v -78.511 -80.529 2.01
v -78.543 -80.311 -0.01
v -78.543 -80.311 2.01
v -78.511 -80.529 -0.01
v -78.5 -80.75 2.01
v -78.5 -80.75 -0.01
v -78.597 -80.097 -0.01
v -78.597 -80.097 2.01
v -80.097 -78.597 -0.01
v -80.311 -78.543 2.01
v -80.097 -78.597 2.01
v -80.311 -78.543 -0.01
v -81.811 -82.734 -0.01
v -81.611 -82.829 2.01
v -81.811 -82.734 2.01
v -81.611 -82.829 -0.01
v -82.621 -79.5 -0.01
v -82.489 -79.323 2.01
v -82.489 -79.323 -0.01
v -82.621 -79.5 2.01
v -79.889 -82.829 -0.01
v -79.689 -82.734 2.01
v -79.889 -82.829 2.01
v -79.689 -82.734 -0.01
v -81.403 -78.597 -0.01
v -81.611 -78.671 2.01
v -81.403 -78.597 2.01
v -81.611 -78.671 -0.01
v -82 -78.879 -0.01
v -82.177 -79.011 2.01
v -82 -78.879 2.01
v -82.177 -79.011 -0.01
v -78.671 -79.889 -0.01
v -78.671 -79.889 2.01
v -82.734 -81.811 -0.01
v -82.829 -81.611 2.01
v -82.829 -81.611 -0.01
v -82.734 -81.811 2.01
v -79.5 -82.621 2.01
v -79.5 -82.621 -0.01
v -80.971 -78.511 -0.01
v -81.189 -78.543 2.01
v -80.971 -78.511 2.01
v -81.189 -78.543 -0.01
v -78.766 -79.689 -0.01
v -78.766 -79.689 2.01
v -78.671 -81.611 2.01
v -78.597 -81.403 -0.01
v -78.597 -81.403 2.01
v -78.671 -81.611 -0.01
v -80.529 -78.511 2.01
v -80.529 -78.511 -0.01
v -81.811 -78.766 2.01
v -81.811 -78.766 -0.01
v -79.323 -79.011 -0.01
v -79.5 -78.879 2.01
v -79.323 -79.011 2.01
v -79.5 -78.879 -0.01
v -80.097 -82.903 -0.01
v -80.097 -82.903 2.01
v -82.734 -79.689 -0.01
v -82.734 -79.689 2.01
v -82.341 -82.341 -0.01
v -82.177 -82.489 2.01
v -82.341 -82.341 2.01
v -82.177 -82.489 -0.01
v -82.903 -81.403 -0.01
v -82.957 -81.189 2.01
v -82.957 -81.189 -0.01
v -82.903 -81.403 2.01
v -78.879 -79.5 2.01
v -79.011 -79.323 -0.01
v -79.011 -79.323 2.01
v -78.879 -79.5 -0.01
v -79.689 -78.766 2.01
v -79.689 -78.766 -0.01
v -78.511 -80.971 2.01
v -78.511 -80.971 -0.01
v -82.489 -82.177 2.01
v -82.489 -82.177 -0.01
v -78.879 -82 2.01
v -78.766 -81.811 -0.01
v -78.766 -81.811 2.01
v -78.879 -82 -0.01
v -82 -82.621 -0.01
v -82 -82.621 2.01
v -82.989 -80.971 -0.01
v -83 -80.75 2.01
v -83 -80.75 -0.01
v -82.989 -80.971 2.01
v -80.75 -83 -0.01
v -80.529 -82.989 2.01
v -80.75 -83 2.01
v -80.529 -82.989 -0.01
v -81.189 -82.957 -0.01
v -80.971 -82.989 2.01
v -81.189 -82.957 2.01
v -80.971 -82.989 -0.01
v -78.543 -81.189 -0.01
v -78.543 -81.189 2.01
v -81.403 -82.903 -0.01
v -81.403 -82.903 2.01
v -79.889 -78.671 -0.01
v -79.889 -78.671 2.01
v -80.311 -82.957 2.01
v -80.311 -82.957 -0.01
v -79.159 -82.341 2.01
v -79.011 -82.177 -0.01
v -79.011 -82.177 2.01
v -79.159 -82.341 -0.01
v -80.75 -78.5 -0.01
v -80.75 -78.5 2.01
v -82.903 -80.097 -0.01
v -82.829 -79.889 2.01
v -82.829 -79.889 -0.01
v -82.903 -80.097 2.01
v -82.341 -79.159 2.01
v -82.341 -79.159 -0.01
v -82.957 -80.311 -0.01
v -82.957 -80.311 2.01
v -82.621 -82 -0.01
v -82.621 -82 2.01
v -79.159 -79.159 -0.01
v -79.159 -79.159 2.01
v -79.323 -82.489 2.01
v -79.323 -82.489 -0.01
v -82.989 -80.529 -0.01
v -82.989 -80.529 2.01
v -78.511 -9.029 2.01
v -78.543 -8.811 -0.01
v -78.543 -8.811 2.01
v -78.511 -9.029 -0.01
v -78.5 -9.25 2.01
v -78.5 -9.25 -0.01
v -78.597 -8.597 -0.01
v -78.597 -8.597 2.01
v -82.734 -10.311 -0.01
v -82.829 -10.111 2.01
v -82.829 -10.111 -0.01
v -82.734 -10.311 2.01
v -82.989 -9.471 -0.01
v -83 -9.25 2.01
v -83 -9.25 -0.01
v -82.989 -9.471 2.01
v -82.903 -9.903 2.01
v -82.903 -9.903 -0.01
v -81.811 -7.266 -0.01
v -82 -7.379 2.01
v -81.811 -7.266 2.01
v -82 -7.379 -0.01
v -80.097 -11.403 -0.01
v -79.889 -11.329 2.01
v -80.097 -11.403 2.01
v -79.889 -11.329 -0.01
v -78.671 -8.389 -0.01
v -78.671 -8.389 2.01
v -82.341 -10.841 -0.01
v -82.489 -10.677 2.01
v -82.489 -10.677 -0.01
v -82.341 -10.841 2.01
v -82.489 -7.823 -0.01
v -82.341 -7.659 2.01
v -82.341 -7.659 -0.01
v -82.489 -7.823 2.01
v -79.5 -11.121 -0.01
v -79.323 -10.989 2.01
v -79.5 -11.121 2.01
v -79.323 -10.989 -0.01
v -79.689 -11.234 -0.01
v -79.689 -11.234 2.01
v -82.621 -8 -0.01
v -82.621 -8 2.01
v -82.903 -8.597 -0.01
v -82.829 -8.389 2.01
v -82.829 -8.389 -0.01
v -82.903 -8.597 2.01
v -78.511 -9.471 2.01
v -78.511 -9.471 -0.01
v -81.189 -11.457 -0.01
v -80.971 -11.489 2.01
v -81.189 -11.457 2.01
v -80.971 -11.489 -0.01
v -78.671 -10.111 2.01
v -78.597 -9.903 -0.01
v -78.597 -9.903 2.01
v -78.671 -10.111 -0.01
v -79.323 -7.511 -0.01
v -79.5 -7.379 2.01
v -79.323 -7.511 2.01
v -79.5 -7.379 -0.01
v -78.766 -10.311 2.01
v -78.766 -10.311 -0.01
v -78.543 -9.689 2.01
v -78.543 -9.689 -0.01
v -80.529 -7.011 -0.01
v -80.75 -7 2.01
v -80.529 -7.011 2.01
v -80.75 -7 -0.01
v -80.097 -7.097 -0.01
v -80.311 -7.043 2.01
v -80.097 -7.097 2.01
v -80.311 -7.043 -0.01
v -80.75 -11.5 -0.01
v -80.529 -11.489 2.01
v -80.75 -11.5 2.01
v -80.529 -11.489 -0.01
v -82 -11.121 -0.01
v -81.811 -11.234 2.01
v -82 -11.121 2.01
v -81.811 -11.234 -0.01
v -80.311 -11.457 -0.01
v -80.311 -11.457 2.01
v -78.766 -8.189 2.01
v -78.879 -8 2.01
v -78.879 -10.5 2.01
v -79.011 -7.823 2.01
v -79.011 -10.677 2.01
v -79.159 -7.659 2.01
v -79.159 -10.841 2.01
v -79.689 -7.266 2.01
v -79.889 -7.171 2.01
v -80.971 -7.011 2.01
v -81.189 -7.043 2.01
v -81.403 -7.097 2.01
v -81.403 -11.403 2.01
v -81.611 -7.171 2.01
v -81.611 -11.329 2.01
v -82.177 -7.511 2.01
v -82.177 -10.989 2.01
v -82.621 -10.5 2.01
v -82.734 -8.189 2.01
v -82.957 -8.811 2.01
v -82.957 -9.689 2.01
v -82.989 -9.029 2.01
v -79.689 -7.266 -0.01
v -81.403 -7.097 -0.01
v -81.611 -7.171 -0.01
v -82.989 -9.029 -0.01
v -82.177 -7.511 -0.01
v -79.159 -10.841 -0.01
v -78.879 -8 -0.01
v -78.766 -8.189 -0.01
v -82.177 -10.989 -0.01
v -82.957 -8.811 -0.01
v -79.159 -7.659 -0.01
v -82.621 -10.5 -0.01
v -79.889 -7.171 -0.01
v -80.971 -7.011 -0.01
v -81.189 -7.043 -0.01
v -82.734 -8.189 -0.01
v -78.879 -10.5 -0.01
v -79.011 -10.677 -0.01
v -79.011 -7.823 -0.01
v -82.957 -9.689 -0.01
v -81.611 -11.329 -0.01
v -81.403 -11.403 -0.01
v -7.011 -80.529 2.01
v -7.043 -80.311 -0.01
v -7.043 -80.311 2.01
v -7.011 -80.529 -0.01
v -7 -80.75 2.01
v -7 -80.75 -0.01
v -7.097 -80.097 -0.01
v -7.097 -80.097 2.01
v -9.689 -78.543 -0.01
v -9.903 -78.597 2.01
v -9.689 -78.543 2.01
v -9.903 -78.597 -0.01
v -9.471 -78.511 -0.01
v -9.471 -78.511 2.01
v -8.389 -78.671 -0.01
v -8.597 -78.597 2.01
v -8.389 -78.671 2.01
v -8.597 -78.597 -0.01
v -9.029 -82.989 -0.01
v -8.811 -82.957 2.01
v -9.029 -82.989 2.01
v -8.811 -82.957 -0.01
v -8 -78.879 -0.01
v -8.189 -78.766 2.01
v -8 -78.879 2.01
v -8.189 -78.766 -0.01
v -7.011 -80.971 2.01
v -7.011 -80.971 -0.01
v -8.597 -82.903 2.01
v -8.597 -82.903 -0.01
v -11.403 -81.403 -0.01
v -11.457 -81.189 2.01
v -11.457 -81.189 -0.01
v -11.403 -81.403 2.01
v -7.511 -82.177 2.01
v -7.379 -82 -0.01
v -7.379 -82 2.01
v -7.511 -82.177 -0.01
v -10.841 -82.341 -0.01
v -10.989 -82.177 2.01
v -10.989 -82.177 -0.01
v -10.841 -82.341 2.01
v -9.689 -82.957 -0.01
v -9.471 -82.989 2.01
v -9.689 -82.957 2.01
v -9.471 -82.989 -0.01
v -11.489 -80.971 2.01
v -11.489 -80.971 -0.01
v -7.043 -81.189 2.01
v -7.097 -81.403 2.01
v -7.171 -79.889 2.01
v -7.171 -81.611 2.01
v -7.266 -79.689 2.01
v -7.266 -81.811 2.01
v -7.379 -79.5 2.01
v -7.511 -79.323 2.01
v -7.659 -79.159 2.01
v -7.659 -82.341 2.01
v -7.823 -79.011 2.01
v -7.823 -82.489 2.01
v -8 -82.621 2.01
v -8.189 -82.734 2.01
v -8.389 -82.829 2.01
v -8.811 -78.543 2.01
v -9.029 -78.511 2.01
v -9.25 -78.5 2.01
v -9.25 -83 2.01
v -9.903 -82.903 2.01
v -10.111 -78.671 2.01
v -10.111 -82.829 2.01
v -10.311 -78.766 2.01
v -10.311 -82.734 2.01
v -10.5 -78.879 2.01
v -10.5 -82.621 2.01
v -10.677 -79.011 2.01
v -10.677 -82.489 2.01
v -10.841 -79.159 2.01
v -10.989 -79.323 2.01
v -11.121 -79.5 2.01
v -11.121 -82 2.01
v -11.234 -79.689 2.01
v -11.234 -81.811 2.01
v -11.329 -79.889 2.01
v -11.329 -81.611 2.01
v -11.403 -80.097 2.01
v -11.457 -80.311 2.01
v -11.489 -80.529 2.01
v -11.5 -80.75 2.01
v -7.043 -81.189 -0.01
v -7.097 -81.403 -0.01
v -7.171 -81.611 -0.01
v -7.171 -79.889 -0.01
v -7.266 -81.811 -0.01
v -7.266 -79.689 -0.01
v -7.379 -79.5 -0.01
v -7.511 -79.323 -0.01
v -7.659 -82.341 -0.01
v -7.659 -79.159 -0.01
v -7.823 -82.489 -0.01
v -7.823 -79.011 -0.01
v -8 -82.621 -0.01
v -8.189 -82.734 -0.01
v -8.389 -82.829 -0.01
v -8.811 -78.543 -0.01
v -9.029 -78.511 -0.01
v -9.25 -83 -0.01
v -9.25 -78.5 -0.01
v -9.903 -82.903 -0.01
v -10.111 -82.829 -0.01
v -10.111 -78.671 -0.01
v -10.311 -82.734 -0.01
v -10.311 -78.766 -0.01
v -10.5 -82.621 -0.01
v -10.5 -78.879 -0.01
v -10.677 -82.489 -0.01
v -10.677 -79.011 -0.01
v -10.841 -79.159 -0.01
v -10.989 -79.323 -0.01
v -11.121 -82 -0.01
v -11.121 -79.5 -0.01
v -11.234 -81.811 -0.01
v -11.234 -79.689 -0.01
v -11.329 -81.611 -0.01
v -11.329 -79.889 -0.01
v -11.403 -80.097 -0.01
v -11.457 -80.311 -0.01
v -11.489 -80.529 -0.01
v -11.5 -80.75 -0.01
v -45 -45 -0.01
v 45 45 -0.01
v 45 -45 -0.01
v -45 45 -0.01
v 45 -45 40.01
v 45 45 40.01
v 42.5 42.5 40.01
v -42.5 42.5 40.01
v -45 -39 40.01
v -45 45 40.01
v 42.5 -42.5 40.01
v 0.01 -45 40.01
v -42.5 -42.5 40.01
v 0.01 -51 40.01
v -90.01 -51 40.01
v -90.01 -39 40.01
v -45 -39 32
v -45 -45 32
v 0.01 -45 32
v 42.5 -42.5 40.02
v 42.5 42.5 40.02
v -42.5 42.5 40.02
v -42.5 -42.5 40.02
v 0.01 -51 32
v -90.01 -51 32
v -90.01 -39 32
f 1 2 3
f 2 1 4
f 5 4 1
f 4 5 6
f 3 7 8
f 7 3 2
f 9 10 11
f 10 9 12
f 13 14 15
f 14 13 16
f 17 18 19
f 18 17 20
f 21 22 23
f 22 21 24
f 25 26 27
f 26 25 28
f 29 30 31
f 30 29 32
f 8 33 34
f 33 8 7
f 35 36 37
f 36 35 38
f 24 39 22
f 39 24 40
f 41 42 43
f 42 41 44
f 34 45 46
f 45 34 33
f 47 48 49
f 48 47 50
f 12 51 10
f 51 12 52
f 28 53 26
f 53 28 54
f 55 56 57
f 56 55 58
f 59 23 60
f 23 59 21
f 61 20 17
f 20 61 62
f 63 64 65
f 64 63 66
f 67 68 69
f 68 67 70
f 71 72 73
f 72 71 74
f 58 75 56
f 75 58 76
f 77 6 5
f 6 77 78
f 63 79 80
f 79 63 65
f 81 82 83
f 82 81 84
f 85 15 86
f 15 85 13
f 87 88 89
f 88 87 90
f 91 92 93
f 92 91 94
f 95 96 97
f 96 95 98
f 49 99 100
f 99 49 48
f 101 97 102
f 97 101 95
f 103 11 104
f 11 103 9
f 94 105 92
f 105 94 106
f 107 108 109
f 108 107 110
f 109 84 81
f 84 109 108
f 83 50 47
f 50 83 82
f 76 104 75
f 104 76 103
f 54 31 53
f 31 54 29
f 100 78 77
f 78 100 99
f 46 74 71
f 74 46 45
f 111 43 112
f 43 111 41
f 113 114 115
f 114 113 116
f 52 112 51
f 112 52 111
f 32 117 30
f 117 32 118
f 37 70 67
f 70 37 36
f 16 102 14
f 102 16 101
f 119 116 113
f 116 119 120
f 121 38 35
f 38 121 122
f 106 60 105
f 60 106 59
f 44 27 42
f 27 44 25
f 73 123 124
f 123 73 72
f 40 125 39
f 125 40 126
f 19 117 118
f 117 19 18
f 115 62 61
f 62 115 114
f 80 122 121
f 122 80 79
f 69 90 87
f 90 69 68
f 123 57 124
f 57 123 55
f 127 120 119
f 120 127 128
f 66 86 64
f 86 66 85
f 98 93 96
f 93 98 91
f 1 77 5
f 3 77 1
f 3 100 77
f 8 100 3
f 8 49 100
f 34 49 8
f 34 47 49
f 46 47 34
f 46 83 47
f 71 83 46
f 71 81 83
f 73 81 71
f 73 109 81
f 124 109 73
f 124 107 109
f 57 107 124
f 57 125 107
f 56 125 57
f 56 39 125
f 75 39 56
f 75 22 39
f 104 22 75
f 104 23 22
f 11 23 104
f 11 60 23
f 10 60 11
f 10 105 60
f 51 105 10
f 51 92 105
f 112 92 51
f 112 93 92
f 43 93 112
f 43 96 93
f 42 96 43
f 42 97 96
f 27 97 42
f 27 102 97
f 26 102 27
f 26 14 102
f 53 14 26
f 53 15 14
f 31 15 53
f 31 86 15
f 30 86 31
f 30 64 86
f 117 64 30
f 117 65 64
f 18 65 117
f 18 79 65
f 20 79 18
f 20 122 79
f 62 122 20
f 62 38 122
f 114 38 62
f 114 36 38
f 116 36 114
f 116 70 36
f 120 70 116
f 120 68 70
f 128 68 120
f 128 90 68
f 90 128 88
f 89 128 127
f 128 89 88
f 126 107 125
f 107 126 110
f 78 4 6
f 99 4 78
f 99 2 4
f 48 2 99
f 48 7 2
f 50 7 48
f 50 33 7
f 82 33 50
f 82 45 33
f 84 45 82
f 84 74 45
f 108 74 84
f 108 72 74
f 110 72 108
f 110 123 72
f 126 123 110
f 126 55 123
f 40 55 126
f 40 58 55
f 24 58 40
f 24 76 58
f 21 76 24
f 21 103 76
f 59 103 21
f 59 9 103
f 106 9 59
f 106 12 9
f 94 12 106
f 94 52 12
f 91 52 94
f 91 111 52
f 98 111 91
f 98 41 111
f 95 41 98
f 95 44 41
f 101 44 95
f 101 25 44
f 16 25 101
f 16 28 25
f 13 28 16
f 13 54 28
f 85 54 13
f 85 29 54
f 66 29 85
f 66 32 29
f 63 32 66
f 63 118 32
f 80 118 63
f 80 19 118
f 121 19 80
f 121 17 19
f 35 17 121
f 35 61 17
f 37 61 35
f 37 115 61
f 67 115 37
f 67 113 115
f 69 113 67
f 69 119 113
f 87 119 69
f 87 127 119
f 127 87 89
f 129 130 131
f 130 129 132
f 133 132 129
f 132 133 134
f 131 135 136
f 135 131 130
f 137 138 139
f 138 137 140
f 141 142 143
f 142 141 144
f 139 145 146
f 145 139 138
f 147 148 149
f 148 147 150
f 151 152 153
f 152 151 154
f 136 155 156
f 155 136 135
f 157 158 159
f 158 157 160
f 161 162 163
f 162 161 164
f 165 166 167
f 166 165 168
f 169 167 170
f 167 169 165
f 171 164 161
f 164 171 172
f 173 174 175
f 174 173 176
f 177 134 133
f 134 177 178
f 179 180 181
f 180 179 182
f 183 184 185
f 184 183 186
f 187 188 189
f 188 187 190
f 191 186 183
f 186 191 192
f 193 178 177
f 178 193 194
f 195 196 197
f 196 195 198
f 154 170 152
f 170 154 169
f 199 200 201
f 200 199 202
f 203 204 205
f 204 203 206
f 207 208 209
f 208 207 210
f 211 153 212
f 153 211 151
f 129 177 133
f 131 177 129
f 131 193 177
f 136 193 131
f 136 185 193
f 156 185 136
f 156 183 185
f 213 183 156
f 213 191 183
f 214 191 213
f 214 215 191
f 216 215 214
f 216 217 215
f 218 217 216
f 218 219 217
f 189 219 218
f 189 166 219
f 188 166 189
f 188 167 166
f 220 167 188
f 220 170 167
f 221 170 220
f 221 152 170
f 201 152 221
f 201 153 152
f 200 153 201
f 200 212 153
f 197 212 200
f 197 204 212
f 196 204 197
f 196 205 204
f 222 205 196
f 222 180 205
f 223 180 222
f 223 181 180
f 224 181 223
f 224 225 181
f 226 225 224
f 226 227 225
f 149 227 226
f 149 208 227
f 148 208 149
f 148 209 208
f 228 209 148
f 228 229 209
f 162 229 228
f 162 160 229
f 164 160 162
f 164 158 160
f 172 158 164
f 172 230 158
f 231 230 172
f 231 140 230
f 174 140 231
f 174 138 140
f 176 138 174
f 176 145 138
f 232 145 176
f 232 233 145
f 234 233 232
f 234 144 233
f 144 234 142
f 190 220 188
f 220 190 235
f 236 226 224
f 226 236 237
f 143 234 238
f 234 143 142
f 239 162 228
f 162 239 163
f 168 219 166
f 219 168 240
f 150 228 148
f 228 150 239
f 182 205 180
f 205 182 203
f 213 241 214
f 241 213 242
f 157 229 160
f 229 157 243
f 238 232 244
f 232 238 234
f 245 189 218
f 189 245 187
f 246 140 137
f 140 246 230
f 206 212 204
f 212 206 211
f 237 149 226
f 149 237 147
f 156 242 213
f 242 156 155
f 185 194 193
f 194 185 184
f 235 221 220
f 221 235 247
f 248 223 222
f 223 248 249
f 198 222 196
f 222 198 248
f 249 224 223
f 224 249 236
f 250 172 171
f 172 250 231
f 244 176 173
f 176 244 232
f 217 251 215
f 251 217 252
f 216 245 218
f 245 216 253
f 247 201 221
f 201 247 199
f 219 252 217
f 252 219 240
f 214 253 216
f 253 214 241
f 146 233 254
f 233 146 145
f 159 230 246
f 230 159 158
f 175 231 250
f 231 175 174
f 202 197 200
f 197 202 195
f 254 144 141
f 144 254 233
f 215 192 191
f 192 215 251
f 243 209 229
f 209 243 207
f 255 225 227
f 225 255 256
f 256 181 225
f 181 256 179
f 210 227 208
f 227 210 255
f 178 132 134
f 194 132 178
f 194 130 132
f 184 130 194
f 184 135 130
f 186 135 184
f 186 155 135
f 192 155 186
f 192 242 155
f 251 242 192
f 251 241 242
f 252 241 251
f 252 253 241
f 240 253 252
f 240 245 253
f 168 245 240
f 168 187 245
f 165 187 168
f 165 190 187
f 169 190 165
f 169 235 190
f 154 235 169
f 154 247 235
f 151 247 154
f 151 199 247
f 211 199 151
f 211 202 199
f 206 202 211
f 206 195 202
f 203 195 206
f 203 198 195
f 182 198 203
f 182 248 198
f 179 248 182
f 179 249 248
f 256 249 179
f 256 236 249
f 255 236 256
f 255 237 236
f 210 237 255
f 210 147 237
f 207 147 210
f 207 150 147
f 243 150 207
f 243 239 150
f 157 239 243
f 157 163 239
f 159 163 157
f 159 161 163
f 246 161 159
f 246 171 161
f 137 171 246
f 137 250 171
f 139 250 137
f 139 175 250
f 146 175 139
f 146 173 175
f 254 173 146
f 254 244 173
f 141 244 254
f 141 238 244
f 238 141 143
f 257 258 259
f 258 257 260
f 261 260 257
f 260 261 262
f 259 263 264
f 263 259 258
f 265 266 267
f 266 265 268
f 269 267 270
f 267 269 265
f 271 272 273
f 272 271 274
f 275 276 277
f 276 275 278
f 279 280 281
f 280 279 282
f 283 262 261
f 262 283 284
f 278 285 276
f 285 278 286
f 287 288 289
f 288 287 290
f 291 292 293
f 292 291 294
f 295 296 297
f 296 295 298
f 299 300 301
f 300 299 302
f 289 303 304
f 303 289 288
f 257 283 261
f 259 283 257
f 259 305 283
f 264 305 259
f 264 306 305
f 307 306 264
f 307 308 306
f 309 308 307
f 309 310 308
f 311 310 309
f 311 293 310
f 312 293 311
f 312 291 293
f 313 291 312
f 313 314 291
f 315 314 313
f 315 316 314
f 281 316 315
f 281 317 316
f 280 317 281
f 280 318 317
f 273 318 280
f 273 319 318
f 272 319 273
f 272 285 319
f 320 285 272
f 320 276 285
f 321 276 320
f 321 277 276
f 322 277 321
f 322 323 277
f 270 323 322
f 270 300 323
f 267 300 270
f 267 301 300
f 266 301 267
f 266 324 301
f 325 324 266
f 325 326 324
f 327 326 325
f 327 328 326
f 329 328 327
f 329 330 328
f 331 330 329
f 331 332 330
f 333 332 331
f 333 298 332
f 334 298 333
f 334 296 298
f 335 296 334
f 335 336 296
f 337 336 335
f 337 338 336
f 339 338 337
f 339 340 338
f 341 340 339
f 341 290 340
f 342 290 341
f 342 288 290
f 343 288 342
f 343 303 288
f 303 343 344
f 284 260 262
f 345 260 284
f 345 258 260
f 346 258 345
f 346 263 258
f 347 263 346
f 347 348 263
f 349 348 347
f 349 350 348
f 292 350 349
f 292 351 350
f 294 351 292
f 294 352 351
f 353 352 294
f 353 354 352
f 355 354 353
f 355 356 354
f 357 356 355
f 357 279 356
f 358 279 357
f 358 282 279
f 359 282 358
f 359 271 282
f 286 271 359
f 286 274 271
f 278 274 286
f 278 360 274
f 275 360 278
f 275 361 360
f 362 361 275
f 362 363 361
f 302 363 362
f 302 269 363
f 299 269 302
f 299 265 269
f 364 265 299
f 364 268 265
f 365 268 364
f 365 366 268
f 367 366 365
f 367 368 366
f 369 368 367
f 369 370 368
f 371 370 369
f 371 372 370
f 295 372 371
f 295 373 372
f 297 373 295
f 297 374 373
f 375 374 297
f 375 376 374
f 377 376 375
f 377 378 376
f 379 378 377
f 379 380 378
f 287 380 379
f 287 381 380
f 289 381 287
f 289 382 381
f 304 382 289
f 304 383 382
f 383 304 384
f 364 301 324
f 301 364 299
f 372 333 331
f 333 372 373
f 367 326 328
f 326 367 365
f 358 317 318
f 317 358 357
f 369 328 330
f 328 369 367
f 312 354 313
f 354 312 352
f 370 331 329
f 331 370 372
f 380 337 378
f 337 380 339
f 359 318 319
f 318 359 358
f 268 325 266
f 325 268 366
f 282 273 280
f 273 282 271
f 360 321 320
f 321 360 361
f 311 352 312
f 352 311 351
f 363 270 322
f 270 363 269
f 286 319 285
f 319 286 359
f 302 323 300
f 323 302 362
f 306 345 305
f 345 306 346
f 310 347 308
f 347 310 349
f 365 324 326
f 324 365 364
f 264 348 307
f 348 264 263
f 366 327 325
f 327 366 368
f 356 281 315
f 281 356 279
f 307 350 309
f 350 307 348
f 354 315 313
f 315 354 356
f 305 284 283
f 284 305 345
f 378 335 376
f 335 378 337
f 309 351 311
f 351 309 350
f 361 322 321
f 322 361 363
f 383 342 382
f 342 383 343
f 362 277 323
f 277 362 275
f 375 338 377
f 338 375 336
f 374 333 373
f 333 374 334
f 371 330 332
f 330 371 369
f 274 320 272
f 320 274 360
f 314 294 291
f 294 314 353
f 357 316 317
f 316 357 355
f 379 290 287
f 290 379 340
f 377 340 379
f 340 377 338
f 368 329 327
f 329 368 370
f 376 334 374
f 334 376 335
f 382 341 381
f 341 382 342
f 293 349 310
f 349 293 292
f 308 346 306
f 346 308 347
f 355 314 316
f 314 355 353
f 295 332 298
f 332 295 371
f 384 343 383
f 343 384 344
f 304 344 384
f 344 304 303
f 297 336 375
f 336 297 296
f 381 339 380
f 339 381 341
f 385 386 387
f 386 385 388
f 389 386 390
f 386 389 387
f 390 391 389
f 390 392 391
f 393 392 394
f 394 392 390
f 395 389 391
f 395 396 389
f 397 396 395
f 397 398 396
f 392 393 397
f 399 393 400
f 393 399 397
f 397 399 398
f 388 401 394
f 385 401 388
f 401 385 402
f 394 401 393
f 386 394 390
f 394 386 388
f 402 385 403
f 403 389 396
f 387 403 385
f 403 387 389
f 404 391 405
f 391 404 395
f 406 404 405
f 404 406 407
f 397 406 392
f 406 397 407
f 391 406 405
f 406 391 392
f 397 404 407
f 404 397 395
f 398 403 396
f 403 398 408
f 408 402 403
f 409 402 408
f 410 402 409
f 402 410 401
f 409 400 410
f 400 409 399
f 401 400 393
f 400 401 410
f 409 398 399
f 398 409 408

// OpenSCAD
// DIY Magnetic Stirrer Housing
// Dimensions in mm

// Main dimensions
outer_size = 90;
wall_thickness = 2.5;
top_thickness = 2;
height = 40;

// Screw hole pattern
screw_hole_diameter = 4.5;
screw_pattern_size = 71.5;
screw_pattern_offset = screw_pattern_size / 2;

// Cable notch dimensions
notch_width = 12;
notch_depth = 8; // from top (z = height - notch_depth to height)
notch_z_start = height - notch_depth;

// Compute inner dimensions
inner_size = outer_size - 2 * wall_thickness;

// Resolution
$fn = 64;

module stirrer_housing() {
    // Main outer box (centered on origin)
    translate([0, 0, -0.01]) 
        cube([outer_size, outer_size, height + 0.02]);
    
    // Hollow out the interior (walls + top)
    translate([wall_thickness, wall_thickness, top_thickness]) 
        cube([inner_size, inner_size, height - top_thickness + 0.02]);
    
    // Remove everything above top plate except the top surface
    translate([0, 0, height]) 
        cube([outer_size, outer_size, 0.01]);
    
    // Screw holes in top plate
    for (i = [-1, 1]) {
        for (j = [-1, 1]) {
            translate([
                screw_pattern_offset * i,
                screw_pattern_offset * j,
                -0.01
            ]) {
                cylinder(h = top_thickness + 0.02, r = screw_hole_diameter / 2);
            }
        }
    }
    
    // Cable notch in one wall (front wall, centered in X)
    // Front wall is at Y = -outer_size/2 (negative Y)
    translate([
        -outer_size / 2 - 0.01,  // extend past wall
        -notch_width / 2,
        notch_z_start
    ]) {
        cube([
            outer_size + 0.02,  // full width
            notch_width,
            notch_depth + 0.01
        ]);
    }
}

// Center the part properly - the original was built from (0,0,0) but should be centered
// Translate to center: move so that the center of the base is at (0,0,0)
translate([-outer_size/2, -outer_size/2, 0])
    stirrer_housing();
